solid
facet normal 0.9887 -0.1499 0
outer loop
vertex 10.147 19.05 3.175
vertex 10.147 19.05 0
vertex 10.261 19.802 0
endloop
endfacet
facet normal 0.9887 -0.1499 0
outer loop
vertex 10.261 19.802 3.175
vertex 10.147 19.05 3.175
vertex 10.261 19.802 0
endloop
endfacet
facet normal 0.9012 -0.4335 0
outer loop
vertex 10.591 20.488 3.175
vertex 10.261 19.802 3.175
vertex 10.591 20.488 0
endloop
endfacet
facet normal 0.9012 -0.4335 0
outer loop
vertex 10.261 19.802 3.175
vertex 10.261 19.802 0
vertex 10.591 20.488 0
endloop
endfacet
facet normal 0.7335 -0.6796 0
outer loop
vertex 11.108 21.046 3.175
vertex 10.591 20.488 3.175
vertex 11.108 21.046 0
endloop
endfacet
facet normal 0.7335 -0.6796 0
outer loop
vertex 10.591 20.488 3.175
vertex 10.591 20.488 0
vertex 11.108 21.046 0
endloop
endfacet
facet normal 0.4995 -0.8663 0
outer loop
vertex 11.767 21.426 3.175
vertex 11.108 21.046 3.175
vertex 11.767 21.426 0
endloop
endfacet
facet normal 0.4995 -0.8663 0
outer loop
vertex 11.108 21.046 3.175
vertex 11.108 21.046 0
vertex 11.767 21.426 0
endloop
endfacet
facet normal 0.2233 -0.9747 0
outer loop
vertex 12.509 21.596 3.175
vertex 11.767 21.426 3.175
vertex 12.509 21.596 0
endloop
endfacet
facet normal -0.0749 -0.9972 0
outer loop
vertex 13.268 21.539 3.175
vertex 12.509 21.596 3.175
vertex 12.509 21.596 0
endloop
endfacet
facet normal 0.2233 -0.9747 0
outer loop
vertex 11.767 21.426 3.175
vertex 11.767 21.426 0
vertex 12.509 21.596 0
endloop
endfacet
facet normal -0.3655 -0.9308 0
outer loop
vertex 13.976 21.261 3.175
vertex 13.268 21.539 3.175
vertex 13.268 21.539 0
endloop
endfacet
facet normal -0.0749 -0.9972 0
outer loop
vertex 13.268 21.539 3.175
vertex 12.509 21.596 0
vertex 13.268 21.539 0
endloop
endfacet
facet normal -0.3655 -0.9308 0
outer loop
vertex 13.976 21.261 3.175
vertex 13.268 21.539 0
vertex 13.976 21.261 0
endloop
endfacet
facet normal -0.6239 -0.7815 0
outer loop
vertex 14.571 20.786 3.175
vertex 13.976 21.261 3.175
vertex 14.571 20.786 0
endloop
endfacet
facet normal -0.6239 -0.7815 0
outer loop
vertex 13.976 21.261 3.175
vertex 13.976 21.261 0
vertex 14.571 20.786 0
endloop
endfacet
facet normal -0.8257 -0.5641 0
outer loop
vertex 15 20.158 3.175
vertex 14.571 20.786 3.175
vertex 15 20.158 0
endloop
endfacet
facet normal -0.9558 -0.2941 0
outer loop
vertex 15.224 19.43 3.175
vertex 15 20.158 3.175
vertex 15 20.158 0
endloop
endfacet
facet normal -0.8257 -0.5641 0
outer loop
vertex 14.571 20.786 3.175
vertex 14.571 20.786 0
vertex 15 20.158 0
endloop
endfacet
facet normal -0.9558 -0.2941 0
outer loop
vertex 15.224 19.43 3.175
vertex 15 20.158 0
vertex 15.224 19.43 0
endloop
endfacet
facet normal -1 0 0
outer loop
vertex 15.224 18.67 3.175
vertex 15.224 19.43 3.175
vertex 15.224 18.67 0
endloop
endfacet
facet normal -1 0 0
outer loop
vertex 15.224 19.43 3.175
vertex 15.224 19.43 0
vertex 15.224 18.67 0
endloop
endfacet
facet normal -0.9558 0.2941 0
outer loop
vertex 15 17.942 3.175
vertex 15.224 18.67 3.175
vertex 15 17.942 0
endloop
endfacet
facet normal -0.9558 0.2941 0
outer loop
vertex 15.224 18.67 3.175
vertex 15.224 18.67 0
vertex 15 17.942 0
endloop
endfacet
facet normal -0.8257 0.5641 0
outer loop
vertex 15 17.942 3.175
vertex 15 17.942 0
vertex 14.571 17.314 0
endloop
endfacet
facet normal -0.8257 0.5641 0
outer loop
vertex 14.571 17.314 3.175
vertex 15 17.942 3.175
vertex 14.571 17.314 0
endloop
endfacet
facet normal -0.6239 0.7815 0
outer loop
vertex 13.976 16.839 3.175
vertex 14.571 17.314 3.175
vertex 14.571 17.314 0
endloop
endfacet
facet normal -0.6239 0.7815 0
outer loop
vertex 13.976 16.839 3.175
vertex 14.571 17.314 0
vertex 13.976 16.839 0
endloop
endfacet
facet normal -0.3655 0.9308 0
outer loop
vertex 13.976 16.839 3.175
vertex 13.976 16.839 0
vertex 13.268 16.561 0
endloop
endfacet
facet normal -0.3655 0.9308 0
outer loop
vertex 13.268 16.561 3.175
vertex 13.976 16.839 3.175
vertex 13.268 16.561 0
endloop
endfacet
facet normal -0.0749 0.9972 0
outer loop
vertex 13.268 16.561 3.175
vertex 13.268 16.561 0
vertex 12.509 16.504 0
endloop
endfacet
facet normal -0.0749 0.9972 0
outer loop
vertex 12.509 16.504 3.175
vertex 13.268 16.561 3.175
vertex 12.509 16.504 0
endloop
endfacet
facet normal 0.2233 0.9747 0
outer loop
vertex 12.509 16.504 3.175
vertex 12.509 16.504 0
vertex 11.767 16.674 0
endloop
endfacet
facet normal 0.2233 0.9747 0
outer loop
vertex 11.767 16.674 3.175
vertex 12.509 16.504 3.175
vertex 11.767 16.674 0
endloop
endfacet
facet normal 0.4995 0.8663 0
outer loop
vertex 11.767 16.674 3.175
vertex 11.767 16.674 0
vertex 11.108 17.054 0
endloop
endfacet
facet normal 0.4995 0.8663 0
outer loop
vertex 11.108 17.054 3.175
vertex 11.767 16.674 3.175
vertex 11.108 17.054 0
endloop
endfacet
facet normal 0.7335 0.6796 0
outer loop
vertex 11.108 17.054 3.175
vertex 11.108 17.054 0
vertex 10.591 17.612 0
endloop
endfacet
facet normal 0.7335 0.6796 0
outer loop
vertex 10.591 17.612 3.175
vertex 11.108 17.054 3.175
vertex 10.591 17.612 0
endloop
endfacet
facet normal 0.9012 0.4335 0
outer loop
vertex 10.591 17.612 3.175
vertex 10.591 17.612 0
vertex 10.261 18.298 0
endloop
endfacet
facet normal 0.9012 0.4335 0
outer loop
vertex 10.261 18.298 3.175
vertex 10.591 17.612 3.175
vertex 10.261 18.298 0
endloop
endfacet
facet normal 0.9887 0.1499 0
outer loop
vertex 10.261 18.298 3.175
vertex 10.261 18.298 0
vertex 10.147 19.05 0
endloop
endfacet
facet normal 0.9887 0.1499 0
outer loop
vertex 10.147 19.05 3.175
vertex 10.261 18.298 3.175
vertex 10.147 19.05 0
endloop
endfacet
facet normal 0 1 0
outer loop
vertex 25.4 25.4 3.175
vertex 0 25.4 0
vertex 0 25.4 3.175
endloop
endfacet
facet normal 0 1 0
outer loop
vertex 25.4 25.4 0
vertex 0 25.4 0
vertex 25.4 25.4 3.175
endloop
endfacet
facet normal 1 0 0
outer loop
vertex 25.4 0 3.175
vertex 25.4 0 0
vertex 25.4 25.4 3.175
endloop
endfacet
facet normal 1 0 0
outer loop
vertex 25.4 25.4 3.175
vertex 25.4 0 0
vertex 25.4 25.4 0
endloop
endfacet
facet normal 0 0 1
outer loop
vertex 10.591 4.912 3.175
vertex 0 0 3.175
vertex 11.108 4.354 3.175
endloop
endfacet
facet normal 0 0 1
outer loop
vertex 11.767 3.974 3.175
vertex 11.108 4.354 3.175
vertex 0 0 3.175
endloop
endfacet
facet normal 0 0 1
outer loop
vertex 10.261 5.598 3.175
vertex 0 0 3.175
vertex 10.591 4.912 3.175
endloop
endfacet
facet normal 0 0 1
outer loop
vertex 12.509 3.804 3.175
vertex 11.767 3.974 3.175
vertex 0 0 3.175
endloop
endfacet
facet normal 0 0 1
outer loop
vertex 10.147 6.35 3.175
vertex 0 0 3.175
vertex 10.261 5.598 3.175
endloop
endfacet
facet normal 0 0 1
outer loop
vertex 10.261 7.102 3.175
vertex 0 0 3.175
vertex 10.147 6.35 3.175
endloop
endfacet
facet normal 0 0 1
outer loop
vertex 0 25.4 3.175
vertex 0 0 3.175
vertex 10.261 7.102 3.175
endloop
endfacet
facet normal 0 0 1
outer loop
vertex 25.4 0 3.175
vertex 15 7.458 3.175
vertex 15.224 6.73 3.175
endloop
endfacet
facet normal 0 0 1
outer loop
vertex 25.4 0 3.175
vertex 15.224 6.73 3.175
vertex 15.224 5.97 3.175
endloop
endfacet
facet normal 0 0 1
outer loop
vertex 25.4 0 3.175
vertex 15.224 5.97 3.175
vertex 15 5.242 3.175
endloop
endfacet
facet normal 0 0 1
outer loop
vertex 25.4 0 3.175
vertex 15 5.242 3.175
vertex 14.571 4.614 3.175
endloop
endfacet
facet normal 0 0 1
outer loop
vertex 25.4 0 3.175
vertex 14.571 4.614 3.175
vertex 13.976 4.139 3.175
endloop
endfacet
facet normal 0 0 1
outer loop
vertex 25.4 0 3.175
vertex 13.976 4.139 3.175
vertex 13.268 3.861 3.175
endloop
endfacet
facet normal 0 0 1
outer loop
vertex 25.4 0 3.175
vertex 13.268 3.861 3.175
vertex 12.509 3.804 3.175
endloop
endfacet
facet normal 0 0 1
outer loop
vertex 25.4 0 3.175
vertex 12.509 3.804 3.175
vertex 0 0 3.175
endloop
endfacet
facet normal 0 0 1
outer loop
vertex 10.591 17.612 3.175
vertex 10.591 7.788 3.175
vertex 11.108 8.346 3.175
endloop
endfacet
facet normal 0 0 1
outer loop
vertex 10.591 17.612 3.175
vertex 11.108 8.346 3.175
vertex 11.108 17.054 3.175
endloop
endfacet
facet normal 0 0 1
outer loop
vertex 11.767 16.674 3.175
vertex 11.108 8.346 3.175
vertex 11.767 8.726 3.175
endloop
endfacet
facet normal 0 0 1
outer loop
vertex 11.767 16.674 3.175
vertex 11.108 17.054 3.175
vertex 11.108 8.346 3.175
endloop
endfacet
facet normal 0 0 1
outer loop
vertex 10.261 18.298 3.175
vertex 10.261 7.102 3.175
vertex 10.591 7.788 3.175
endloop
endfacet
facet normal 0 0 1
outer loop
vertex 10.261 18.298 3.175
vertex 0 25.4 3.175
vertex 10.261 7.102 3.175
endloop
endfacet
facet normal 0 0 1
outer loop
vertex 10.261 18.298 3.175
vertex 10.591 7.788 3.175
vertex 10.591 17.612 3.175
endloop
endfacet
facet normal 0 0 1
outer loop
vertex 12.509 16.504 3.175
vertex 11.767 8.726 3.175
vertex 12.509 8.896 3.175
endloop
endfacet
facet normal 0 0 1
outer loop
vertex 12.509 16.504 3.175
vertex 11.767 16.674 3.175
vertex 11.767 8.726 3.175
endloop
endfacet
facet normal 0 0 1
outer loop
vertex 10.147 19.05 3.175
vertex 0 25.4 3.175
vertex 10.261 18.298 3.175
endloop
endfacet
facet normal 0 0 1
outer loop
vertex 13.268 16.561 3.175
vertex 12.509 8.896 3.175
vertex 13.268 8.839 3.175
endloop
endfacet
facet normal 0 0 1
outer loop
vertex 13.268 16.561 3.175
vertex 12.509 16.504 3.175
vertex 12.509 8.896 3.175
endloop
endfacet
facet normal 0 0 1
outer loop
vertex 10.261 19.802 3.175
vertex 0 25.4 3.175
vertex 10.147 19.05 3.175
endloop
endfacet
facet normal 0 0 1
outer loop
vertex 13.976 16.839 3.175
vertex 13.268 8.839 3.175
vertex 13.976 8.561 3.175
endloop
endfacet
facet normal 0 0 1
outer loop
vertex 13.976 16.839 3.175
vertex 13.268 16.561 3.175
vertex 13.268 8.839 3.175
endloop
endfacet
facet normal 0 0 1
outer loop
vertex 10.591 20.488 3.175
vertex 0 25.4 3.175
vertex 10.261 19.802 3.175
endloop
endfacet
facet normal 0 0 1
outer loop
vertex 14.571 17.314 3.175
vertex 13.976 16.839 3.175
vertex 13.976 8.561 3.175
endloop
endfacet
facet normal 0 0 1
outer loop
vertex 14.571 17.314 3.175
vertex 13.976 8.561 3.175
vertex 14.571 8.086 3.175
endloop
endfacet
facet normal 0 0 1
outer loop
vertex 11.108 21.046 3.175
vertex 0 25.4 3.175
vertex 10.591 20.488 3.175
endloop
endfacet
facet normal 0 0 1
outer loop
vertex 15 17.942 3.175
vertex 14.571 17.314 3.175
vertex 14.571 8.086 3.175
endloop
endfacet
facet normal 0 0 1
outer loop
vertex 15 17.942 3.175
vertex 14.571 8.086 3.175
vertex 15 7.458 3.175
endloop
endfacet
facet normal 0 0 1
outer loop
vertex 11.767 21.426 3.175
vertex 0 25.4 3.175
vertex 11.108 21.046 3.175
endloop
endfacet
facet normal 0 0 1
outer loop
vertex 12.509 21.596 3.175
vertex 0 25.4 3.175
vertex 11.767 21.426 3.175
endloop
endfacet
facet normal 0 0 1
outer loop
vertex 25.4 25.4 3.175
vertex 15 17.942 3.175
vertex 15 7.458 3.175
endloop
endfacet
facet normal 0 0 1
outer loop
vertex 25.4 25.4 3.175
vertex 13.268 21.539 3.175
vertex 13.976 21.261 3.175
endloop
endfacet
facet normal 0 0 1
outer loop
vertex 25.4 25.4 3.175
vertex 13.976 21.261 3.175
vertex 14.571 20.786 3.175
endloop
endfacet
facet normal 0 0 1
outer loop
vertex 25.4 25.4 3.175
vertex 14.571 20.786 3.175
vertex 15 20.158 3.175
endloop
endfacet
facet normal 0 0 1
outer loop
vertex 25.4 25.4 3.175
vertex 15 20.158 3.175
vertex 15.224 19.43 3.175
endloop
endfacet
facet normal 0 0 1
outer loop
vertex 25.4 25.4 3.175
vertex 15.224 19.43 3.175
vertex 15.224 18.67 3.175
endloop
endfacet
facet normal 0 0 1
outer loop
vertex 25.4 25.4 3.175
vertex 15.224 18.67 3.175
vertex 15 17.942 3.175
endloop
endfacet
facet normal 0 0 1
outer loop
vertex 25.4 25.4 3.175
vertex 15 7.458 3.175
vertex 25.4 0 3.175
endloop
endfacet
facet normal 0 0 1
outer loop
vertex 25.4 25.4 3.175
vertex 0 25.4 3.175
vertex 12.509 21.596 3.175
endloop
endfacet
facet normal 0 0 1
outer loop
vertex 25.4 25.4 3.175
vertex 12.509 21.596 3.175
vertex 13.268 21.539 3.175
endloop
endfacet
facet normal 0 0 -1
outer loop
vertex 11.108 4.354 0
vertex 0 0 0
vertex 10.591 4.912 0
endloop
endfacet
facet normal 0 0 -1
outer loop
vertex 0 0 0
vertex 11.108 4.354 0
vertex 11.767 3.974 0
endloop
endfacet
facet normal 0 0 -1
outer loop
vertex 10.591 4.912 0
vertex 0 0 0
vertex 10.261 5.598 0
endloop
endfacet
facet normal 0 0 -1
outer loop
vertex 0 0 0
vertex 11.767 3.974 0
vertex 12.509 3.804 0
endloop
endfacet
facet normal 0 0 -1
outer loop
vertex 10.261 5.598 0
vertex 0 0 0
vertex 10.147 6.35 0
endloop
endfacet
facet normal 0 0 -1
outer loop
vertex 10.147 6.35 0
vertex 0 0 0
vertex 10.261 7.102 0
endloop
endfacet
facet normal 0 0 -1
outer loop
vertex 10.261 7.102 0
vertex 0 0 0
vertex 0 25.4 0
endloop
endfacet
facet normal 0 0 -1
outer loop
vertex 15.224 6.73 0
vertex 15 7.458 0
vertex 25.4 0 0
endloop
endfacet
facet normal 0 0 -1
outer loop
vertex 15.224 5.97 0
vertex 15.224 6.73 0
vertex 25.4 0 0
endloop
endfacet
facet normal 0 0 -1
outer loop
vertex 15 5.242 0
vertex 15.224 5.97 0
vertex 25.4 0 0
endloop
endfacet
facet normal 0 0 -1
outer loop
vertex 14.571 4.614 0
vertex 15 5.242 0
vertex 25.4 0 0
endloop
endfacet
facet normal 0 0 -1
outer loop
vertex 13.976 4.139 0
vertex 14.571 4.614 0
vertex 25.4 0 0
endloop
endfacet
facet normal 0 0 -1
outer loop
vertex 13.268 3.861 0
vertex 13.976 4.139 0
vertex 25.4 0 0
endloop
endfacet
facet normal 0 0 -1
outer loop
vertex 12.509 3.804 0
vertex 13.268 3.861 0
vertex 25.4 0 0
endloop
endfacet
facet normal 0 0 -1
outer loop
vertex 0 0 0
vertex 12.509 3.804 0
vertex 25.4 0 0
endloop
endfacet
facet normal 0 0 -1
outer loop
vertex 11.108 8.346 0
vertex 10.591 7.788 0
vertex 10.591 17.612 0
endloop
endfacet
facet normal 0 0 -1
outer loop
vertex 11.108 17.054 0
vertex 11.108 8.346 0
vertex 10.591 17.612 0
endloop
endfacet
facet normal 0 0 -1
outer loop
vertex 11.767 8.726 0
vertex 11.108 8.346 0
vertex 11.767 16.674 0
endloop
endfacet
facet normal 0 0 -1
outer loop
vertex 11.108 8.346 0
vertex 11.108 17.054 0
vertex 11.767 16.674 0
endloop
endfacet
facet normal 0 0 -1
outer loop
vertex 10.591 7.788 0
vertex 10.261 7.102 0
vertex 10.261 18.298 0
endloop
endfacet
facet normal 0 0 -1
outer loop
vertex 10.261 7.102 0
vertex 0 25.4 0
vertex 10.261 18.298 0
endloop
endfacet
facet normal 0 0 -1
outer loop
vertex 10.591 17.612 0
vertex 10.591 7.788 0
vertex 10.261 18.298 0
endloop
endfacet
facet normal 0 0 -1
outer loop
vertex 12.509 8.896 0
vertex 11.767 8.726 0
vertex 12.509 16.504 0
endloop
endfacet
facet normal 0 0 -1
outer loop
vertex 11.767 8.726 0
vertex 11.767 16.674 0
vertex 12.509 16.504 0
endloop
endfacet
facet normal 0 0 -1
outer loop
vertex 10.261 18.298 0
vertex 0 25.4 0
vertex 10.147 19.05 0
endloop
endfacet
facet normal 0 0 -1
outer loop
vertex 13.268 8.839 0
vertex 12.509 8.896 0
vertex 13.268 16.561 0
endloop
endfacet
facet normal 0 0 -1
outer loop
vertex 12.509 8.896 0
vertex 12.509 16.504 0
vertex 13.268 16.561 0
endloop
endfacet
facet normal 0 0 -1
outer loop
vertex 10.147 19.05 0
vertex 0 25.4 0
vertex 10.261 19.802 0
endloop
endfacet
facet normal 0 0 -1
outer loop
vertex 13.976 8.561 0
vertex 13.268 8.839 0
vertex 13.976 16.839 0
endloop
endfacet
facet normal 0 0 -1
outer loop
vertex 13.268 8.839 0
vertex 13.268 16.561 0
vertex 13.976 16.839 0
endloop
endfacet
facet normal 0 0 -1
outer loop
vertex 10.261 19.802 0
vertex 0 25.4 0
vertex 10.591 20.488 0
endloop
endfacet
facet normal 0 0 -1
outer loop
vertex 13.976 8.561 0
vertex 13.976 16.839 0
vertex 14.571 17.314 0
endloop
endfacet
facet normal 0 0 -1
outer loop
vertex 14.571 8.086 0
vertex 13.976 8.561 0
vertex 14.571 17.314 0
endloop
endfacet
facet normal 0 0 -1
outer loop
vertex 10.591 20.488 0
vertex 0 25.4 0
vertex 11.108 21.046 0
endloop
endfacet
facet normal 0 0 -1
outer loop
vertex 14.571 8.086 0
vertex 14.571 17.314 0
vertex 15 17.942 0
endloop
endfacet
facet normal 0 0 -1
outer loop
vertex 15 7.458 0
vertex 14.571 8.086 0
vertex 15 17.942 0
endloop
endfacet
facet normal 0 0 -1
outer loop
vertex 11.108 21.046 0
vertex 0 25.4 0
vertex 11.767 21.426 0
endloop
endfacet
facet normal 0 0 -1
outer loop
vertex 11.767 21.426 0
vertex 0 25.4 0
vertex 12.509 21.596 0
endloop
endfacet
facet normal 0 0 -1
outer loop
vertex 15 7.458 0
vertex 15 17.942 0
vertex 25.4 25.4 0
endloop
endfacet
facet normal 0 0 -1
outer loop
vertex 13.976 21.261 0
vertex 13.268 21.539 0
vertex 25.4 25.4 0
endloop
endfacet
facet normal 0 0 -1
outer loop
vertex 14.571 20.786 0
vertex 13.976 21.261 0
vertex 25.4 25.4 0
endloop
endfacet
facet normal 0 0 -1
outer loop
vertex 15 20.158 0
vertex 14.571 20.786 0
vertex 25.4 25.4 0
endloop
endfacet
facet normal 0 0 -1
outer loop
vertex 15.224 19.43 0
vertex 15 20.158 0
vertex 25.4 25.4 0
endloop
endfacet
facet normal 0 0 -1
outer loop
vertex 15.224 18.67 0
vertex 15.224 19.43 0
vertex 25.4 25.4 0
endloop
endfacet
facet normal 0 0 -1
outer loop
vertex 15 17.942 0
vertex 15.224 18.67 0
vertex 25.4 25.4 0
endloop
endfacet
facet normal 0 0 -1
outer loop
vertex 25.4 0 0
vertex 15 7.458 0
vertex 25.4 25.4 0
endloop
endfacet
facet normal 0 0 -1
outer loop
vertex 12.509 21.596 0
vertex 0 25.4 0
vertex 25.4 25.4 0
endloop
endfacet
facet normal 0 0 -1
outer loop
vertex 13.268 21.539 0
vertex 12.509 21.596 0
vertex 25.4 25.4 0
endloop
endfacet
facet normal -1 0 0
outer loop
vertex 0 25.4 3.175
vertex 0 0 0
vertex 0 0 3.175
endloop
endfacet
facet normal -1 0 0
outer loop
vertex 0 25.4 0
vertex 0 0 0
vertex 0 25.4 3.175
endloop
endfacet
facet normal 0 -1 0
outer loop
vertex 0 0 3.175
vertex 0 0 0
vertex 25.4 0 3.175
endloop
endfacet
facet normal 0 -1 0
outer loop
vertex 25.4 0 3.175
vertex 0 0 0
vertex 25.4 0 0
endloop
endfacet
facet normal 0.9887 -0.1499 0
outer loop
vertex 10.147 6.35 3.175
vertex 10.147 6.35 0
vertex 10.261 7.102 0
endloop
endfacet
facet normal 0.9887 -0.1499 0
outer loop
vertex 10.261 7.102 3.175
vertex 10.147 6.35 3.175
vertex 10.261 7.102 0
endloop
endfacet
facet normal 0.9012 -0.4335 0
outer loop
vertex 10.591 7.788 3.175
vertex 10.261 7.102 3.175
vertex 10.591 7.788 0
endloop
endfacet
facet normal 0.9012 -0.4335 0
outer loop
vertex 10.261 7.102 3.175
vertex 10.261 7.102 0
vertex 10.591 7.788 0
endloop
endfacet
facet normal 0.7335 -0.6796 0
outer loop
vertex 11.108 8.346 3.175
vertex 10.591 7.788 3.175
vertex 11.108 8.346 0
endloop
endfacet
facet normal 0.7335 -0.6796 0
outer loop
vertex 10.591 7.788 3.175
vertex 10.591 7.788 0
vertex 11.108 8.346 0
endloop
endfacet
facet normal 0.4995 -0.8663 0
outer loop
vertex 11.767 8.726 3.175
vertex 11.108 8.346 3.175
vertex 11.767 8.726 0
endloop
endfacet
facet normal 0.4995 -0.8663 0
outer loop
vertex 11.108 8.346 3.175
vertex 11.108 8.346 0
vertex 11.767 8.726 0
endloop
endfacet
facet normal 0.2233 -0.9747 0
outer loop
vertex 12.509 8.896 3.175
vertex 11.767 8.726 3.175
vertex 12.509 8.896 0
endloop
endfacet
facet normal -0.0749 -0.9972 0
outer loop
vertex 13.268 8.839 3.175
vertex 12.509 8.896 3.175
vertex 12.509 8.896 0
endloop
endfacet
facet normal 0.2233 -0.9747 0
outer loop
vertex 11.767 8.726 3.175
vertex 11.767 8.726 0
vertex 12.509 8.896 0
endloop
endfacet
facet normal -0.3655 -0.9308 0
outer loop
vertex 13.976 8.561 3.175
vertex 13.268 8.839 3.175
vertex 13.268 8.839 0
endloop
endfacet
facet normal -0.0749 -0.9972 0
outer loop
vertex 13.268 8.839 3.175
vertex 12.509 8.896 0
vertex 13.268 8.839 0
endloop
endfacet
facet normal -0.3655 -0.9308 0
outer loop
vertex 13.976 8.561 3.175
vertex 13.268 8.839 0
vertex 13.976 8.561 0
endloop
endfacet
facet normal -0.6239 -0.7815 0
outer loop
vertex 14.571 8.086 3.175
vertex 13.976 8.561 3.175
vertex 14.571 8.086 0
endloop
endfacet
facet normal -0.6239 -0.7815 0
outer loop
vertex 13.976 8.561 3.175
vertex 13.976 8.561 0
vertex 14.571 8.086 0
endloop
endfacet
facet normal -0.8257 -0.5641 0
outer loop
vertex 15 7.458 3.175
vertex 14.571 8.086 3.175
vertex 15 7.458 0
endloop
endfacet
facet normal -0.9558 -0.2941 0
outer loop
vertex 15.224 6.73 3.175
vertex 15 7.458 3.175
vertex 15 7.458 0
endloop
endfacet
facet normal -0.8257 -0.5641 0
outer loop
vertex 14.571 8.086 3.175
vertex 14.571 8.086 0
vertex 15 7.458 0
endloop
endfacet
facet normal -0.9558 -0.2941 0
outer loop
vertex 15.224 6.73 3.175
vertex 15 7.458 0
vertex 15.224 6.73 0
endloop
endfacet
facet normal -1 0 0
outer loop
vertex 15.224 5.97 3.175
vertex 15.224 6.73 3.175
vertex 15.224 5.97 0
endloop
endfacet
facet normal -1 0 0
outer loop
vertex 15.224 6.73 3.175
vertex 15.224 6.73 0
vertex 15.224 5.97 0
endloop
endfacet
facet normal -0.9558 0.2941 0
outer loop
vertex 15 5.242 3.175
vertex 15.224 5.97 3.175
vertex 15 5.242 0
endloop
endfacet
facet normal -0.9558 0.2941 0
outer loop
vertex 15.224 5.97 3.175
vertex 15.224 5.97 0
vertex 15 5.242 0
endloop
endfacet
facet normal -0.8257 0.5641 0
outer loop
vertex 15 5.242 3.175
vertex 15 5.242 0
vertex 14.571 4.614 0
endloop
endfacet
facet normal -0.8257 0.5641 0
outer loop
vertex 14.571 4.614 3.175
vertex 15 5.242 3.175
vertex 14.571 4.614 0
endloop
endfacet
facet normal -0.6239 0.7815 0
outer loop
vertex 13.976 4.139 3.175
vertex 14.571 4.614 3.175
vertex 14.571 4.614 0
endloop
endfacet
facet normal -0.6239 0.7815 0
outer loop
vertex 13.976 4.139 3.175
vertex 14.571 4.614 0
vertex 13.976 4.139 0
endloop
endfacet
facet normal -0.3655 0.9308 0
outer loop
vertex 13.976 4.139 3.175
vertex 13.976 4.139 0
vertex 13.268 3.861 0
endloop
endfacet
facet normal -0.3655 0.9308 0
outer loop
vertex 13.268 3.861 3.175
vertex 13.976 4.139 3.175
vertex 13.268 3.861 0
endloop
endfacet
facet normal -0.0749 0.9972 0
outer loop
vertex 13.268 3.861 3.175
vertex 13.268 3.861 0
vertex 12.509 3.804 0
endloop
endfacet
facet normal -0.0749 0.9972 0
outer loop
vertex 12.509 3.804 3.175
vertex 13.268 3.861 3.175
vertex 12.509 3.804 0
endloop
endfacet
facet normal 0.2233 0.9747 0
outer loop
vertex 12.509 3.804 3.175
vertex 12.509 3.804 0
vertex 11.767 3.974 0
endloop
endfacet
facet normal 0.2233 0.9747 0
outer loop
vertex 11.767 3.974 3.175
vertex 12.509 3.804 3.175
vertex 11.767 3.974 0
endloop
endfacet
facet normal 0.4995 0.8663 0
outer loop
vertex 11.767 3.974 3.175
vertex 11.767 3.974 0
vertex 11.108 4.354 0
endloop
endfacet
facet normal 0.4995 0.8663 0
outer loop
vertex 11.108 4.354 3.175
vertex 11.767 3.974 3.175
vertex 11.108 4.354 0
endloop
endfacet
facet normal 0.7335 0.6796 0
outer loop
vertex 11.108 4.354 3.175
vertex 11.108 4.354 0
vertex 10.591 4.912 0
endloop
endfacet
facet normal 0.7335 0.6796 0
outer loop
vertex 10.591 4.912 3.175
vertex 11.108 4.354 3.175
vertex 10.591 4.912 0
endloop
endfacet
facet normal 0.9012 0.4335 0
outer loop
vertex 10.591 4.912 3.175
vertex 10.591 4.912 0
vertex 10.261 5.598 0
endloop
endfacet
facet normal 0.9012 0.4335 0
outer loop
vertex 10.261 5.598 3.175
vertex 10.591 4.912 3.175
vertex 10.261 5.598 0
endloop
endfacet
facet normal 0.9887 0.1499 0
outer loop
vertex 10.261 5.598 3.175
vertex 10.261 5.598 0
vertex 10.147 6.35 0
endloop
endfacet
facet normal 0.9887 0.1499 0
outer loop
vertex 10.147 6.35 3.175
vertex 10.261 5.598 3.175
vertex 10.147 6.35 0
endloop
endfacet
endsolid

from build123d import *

# Parameters (mm, degrees)
SKETCH1_W           = 25.4
SKETCH1_H           = 25.4
BOSS_EXTRUDE1_DEPTH = 3.175
CUT_EXTRUDE1_REACH  = 5.175
SKETCH2_R           = 2.5527


with BuildPart() as part:
    # Sketch1 → Boss-Extrude1 (new body)
    with BuildSketch(Plane.XY):
        with Locations((12.7, 12.7)):
            Rectangle(SKETCH1_W, SKETCH1_H)
    extrude(amount=BOSS_EXTRUDE1_DEPTH)

    # Sketch2 → Cut-Extrude1 (cut, up to next)
    with BuildSketch(Plane(origin=(0, 0, 0), x_dir=(-1, 0, 0), z_dir=(0, 0, -1)), mode=Mode.PRIVATE) as cut_extrude1_sk1:
        with Locations((-12.7, 6.35)):
            Circle(SKETCH2_R)
    cut_extrude1_tool1 = extrude(cut_extrude1_sk1.sketch, amount=-CUT_EXTRUDE1_REACH, mode=Mode.PRIVATE) & part.part
    add(cut_extrude1_tool1.solids().sort_by_distance((12.7, 6.35, 0))[0], mode=Mode.SUBTRACT)
    # Sketch2 → Cut-Extrude1 (cut, up to next)
    with BuildSketch(Plane(origin=(0, 0, 0), x_dir=(-1, 0, 0), z_dir=(0, 0, -1)), mode=Mode.PRIVATE) as cut_extrude1_sk2:
        with Locations((-12.7, 19.05)):
            Circle(SKETCH2_R)
    cut_extrude1_tool2 = extrude(cut_extrude1_sk2.sketch, amount=-CUT_EXTRUDE1_REACH, mode=Mode.PRIVATE) & part.part
    add(cut_extrude1_tool2.solids().sort_by_distance((12.7, 19.05, 0))[0], mode=Mode.SUBTRACT)


solid = part.part
